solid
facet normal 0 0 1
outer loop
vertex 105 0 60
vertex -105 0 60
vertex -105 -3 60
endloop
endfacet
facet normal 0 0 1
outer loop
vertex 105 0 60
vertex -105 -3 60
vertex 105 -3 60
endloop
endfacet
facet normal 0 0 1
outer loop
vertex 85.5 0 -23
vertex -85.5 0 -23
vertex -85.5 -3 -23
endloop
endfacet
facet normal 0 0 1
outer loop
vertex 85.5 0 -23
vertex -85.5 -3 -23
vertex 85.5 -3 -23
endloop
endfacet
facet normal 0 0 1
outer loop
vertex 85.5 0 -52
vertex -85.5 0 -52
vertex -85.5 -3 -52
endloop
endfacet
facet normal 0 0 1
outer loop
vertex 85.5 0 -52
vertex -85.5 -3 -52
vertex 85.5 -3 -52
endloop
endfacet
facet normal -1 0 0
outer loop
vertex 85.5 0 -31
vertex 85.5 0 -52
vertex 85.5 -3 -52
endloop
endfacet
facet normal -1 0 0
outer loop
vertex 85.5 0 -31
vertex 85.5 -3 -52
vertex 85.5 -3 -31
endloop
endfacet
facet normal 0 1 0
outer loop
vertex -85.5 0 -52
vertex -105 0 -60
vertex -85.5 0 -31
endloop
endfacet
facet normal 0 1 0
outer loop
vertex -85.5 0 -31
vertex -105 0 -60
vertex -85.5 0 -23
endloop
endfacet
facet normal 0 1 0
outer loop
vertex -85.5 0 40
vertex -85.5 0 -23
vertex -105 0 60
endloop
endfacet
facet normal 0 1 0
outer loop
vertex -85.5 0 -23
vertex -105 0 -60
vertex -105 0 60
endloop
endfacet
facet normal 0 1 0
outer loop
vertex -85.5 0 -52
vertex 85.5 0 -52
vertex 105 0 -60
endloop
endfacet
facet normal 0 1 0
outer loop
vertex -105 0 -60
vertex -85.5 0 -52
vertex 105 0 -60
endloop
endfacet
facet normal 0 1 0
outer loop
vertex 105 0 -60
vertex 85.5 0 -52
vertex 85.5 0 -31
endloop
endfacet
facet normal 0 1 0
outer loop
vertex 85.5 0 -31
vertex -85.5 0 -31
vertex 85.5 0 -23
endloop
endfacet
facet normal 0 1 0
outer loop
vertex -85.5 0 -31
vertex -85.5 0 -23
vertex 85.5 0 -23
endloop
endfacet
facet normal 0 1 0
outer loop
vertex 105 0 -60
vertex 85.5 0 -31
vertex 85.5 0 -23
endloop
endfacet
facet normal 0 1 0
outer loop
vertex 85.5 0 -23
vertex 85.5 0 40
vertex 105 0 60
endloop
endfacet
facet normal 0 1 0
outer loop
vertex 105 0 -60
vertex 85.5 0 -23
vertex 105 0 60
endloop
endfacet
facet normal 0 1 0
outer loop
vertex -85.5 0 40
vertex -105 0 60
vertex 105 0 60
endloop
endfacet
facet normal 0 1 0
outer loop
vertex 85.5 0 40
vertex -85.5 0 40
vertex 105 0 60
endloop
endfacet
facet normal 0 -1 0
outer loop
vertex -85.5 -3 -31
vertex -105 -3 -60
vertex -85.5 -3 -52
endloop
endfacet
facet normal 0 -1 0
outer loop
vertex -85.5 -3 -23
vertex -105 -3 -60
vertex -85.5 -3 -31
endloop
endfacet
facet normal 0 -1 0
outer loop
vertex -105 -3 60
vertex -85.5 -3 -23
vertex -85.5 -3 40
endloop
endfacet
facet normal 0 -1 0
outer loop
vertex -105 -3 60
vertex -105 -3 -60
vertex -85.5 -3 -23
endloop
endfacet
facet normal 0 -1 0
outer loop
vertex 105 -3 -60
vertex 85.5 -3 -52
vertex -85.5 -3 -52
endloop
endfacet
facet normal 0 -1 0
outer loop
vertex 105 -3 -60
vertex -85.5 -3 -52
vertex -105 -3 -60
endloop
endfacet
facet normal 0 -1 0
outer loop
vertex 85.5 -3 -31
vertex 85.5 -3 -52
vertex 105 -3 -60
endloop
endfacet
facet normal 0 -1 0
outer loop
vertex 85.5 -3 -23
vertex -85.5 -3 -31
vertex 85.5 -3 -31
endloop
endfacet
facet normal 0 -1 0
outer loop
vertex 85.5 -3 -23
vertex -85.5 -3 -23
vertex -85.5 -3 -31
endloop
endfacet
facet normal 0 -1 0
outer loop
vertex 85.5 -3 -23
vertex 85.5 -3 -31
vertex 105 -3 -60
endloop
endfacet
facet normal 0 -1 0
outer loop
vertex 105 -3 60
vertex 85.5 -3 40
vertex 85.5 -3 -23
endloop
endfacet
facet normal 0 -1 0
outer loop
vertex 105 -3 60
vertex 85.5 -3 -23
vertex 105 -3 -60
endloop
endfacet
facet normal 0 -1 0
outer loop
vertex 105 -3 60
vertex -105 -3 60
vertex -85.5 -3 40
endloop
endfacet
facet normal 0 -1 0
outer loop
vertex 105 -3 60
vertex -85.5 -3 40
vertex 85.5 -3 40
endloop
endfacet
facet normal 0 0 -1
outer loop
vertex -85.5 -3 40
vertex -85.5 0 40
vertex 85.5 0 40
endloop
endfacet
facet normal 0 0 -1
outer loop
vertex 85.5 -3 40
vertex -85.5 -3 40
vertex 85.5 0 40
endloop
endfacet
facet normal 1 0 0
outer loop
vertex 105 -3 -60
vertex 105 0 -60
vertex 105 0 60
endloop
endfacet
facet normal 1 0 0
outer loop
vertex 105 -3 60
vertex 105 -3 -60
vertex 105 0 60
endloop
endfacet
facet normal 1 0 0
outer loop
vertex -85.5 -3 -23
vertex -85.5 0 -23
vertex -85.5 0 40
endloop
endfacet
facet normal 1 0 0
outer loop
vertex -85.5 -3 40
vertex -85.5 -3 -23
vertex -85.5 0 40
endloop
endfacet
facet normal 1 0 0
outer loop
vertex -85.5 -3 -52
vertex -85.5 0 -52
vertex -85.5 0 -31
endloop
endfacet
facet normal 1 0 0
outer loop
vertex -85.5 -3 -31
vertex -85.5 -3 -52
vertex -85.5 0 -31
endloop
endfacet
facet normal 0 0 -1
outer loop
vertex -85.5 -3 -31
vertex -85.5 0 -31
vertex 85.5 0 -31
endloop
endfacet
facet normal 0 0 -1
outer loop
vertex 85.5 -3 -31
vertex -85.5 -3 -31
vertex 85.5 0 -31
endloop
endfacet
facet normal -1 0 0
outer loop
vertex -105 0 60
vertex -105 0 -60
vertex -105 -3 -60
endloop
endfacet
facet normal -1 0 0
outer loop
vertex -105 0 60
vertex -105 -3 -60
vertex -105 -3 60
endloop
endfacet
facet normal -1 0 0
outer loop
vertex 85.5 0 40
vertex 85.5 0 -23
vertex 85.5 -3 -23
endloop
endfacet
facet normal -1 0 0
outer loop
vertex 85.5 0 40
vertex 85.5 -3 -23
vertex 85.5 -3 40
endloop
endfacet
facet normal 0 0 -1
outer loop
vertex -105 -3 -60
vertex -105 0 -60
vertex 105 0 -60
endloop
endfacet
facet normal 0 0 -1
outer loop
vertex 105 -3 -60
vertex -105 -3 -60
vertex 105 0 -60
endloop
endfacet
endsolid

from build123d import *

# Parameters (mm, degrees)
F0_W     = 210
F0_H     = 120
F0_W_2   = 171
F0_H_2   = 21
F0_H_3   = 63
F1_DEPTH = 3


with BuildPart() as f1:
    # F0 (on Front) → F1 (new body)
    with BuildSketch(Plane.XZ):
        Rectangle(F0_W, F0_H)
        with Locations((0, -41.5)):
            Rectangle(F0_W_2, F0_H_2, mode=Mode.SUBTRACT)
        with Locations((0, 8.5)):
            Rectangle(F0_W_2, F0_H_3, mode=Mode.SUBTRACT)
    extrude(amount=F1_DEPTH)


solid = f1.part
